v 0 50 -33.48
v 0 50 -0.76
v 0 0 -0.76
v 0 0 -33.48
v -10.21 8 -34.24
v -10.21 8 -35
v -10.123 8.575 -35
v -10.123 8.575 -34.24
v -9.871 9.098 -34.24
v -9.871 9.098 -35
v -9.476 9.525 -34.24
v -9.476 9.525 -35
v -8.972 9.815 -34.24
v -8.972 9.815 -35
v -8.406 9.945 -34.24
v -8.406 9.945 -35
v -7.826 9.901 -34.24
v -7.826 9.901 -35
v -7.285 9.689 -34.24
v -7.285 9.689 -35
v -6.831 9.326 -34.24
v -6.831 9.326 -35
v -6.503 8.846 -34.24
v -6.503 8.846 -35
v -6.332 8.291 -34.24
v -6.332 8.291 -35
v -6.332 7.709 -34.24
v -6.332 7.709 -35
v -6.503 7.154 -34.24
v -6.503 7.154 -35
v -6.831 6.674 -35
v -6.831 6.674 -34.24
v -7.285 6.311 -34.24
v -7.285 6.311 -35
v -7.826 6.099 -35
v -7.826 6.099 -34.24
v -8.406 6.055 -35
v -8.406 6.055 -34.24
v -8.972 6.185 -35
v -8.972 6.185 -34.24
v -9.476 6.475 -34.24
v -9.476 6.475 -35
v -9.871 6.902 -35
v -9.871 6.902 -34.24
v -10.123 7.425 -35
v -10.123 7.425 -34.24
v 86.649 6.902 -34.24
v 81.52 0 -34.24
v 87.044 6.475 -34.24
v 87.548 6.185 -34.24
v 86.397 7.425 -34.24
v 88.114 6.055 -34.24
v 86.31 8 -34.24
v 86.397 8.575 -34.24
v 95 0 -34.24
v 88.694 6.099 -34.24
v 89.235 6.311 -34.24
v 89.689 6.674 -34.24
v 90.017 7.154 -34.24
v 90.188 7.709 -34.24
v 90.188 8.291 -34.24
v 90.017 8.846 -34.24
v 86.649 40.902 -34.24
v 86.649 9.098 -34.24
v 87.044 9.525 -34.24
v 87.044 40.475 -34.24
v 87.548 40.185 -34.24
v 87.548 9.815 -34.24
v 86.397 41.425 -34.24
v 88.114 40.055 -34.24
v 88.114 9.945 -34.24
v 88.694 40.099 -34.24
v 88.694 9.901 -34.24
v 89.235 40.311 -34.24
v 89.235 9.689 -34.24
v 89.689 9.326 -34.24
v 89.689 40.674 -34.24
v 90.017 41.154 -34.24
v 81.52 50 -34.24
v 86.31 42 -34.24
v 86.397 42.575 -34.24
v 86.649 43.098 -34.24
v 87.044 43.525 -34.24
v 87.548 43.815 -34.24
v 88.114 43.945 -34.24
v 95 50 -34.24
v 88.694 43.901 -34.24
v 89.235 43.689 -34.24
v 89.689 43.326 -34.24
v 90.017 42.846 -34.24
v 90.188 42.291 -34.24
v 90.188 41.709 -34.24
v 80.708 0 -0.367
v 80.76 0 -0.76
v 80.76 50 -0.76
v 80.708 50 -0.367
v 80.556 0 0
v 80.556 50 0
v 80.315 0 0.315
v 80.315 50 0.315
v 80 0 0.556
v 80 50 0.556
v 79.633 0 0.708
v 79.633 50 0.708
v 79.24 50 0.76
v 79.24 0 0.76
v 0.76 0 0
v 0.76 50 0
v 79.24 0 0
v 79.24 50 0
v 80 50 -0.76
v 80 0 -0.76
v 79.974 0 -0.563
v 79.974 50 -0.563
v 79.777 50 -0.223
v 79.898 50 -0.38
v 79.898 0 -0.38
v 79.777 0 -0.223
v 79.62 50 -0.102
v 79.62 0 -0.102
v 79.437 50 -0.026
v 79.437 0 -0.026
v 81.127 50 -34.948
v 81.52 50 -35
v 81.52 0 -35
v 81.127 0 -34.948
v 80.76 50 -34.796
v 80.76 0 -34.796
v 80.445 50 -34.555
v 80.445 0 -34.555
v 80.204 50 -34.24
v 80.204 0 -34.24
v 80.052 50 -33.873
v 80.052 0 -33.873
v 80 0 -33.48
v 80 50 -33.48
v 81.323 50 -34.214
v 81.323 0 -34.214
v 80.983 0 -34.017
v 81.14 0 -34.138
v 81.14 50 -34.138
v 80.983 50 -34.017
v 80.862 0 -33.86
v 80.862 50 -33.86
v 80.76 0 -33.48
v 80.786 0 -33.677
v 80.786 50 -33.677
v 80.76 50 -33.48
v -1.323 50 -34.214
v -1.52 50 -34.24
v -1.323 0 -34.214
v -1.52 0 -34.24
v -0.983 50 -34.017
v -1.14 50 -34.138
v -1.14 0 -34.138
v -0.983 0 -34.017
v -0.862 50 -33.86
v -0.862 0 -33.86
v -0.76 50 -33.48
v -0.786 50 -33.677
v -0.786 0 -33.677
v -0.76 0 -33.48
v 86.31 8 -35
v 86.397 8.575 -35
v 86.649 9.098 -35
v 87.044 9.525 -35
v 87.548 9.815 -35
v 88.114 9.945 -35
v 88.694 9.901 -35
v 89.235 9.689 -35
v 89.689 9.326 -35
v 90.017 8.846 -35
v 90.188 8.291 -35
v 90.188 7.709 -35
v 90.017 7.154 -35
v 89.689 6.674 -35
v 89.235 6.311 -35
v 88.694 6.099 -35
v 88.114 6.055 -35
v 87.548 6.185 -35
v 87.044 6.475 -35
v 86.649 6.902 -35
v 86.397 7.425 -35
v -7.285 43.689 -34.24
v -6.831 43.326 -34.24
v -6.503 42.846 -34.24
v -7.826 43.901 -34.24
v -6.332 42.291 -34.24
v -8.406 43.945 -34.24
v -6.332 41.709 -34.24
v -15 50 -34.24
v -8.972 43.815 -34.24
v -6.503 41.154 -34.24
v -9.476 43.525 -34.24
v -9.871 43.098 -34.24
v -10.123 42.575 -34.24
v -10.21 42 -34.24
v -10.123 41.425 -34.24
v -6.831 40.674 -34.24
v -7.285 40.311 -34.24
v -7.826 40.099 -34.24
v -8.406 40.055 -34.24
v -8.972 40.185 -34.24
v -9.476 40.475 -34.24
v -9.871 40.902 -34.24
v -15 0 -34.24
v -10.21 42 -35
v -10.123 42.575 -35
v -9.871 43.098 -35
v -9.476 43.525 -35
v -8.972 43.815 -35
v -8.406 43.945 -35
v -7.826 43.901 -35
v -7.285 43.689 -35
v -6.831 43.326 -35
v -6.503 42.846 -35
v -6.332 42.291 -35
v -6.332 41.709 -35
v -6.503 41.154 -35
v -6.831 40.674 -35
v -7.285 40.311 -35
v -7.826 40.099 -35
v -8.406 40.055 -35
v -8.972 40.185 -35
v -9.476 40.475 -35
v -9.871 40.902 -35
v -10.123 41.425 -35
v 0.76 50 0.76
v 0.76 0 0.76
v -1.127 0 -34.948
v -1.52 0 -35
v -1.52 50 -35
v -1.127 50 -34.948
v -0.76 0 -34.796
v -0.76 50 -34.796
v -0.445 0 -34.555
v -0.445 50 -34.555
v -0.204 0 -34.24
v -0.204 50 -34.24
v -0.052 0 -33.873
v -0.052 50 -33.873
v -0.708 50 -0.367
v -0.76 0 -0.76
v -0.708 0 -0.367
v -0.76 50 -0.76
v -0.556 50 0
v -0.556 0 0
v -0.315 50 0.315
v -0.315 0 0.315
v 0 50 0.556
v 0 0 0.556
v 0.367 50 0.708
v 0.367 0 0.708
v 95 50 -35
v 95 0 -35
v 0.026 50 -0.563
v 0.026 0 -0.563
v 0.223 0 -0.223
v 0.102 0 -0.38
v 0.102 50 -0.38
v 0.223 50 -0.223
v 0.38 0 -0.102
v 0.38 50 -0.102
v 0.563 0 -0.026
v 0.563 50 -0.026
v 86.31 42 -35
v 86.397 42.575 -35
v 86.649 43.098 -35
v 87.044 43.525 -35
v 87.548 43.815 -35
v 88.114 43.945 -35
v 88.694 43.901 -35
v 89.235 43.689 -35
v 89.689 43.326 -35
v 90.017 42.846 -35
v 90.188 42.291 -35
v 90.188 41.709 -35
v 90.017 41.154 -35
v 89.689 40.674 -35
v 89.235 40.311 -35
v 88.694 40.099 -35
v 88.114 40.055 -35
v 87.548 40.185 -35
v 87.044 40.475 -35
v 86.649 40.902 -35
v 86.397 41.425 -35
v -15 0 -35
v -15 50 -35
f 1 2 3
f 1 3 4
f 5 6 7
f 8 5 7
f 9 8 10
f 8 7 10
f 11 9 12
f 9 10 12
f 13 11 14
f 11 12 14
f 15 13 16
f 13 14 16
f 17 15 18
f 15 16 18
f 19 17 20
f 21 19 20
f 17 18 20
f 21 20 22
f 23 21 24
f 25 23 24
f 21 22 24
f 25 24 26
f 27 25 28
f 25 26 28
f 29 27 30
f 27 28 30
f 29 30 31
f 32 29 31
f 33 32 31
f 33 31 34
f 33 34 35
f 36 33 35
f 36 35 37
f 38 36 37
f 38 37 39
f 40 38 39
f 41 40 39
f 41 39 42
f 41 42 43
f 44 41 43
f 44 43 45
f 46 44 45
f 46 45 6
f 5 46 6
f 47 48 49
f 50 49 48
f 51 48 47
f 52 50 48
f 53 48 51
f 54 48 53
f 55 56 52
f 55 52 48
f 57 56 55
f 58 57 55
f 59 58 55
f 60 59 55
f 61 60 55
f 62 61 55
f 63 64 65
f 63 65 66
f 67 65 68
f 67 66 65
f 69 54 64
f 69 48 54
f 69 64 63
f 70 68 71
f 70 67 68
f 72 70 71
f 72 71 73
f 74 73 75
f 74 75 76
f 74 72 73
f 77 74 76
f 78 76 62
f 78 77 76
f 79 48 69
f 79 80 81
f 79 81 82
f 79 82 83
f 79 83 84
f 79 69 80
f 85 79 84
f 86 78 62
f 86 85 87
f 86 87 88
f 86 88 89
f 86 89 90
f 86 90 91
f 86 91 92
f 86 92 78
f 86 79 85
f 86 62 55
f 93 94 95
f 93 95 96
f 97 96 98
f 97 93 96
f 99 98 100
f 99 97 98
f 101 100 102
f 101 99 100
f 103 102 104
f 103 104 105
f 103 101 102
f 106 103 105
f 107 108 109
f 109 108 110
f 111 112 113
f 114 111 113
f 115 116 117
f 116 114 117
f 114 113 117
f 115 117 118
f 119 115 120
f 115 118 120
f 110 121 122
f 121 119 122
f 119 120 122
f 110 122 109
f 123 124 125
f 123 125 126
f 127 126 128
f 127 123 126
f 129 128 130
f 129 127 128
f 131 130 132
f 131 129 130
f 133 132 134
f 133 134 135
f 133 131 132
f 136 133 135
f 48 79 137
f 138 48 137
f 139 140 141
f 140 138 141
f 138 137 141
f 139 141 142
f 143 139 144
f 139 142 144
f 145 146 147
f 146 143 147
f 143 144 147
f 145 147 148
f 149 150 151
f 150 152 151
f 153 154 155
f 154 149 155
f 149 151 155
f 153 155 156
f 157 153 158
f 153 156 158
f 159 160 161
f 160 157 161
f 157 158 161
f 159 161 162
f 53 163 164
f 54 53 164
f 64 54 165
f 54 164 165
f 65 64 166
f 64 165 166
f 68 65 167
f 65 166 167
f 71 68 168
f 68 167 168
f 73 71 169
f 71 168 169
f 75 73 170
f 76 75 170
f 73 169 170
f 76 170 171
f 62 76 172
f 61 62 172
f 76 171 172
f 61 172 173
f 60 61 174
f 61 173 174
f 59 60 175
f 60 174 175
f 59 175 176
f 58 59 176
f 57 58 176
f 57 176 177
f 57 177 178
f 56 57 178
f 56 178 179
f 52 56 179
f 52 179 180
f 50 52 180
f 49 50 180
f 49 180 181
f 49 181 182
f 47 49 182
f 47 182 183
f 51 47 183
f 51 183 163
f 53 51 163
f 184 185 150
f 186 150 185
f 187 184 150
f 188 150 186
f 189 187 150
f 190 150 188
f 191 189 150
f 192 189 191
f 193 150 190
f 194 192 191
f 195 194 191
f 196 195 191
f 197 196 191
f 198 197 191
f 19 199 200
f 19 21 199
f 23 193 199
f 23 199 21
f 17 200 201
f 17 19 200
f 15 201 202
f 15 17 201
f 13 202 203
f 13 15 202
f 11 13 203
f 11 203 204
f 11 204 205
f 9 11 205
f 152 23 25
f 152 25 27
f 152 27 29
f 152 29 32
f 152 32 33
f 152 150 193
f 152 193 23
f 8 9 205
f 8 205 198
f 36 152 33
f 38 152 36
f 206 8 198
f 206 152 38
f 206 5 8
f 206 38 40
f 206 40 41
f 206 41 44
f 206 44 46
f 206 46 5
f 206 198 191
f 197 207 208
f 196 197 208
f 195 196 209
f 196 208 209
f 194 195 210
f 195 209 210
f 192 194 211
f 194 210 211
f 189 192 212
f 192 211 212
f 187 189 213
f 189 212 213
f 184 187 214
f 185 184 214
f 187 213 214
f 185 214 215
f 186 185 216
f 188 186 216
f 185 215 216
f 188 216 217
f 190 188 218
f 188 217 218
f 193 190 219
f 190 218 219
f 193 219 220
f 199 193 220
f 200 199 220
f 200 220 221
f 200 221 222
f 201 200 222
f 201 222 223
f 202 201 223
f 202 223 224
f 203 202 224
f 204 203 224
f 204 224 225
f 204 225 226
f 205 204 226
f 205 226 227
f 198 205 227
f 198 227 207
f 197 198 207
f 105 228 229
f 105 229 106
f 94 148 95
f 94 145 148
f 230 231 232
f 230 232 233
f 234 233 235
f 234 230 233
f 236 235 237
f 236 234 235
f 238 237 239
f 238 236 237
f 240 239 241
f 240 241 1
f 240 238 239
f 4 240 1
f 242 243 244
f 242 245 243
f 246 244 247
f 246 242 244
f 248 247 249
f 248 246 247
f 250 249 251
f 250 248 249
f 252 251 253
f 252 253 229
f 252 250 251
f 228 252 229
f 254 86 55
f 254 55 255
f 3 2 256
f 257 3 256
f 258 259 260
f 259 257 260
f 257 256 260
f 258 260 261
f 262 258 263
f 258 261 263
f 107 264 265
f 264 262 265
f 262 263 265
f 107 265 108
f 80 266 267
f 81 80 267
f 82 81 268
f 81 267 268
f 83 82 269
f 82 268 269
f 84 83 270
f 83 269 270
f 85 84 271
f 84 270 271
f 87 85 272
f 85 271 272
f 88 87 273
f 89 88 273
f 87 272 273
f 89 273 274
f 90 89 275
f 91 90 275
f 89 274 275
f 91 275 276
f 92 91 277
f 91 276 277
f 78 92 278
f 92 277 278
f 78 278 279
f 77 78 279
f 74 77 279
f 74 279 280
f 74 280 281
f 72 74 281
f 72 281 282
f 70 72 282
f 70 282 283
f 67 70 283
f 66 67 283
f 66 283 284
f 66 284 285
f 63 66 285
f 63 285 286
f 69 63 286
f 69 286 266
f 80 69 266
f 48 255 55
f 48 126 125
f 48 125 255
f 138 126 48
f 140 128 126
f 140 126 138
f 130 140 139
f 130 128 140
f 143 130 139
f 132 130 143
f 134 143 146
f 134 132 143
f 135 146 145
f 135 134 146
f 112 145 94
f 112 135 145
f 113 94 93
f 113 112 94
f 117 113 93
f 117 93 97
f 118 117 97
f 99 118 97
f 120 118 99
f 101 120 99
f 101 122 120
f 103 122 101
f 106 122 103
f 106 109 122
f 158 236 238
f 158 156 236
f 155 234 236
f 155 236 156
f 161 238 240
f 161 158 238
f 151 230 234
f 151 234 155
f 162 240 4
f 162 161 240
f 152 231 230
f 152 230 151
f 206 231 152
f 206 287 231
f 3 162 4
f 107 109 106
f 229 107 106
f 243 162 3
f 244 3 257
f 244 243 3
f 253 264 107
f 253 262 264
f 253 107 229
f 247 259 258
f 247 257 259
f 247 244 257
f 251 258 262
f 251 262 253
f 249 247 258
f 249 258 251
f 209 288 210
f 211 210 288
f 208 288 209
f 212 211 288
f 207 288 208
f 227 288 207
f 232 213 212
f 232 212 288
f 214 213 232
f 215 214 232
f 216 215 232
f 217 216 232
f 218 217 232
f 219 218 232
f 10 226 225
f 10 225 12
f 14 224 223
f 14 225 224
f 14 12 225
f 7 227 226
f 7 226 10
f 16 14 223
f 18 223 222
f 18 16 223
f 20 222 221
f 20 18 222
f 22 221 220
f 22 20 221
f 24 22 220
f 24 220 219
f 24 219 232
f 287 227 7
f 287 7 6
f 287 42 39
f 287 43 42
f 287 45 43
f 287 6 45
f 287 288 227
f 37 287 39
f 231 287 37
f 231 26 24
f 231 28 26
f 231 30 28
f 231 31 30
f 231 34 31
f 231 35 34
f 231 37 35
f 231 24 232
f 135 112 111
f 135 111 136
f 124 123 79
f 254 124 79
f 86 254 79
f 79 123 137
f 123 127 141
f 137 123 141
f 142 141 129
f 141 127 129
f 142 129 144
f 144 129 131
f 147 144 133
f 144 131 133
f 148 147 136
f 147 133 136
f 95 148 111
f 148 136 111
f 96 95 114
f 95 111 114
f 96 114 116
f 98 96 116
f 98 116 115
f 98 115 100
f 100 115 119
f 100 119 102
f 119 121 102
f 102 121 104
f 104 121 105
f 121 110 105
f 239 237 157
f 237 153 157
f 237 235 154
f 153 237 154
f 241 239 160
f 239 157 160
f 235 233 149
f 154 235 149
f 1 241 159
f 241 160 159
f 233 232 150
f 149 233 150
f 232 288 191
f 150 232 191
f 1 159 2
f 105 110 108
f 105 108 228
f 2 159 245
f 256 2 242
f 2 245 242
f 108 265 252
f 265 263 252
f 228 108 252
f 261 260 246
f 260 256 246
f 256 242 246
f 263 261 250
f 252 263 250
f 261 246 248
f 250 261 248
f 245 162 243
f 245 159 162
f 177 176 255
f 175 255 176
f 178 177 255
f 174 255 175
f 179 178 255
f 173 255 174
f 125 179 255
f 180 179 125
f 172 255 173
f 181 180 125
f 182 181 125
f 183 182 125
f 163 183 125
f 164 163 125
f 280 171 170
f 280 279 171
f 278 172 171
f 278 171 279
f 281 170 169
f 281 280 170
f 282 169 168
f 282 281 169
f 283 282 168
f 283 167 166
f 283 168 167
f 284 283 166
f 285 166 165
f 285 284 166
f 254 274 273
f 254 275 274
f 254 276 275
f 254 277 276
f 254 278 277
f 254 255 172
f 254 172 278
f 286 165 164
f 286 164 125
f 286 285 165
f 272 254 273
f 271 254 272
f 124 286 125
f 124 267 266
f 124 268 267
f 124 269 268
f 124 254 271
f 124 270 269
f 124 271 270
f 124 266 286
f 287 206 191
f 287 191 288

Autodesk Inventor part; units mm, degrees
ref_plane "YZ Plane" through (0, 0, 0) normal (1, 0, 0) x (0, 1, 0)
ref_plane "XZ Plane" through (0, 0, 0) normal (0, 1, 0) x (-1, 0, 0)
ref_plane "XY Plane" through (0, 0, 0) normal (0, 0, 1) x (1, 0, 0)
sketch "Boceto1" plane through (0, 0, 0) normal (0, 0, 1) x (1, 0, 0)
  line L0 (0, 0) -> (80, 0)
  line L1 (80, 0) -> (80, 50)
  line L2 (80, 50) -> (0, 50)
  line L3 (0, 50) -> (0, 0)
  dimension "d0" = 80
  dimension "d1" = 50
extrude "Placa1" add sketch "Boceto1" along normal blind 0.76
sketch "Boceto2" plane through (80, 50, 0) normal (1, 0, 0) x (0, 1, 0)
  line L0 (-50, 0) -> (0, 0)
  line L1 (0, 0) -> (0, 34.24)
  line L2 (0, 34.24) -> (-50, 34.24)
  line L3 (-50, 34.24) -> (-50, 0)
edge flange "Pestaña1" height 35 angle 90 thickness 0.76 bend radius 0.76 thickness toward (1, 0, 0) relief tear relief width 0.76 relief depth 0.38 corner gap 0.76 corner form 0 edges at (80, 25, 0.76) (0, 25, 0.76) wall of the first edge with corners at (80, 0, 0) (80, 50, 0) (80, 50, -34.24) (80, 0, -34.24)
bend "Doblez1"
corner "Esquina1"
sketch "Boceto3" plane through (-0.76, 50, -34.24) normal (0, 0, -1) x (1, 0, 0)
  line L0 (0, -50) -> (0, 0)
  line L1 (0, 0) -> (-14.24, 0)
  line L2 (-14.24, 0) -> (-14.24, -50)
  line L3 (-14.24, -50) -> (0, -50)
edge flange "Pestaña2" height 15 angle 90 thickness 0.76 bend radius 0.76 thickness toward (0, 0, -1) relief tear relief width 0.76 relief depth 0.38 corner gap 0.76 corner form 0 edges at (0, 25, -34.24) (80, 25, -34.24) wall of the first edge with corners at (-0.76, 0, -34.24) (-0.76, 50, -34.24) (-15, 50, -34.24) (-15, 0, -34.24)
bend "Doblez2"
corner "Esquina2"
sketch "Boceto4" plane through (-15, 0, -35) normal (0, 0, -1) x (-1, 0, 0)
  circle A0 centre (-6.74, 8) radius 1.95
  circle A1 centre (-6.74, 42) radius 1.95
  point P0 (-15, 0)
  dimension "d23" = 3.9
  dimension "d24" = 3.9
extrude "Extrusión1" cut sketch "Boceto4" against normal through all
sketch "Boceto5" plane through (95, 0, -35) normal (0, 0, -1) x (-1, 0, 0)
  circle A0 centre (6.74, 8) radius 1.95
  circle A1 centre (6.74, 42) radius 1.95
  point P0 (95, 0)
  dimension "d27" = 3.9
  dimension "d28" = 3.9
extrude "Extrusión2" cut sketch "Boceto5" against normal through all
sketch "Boceto6" plane through (0, 0, 0.76) normal (0, 0, 1) x (1, 0, 0)
  point P0 (0, 0)
equation "\"d24\" = d23"
equation "\"d28\" = d27"
equation "\"d2\" = Grosor"
equation "\"d3\" = Anchura_desahogo_plegado"
equation "\"d4\" = Profundidad_desahogo_plegado"
equation "\"d5\" = Remanente_mínimo"
equation "\"d6\" = Radiodetransición"
equation "\"d9\" = Radio_pliegue"
equation "\"d10\" = Tamaño_destalonado"
equation "\"d11\" = TamañoSeparación"
equation "\"d12\" = Tamaño_de_radio_de_Jacobi"
equation "\"d13\" = Anchura_desahogo_plegado"
equation "\"d14\" = Profundidad_desahogo_plegado"
equation "\"d15\" = Remanente_mínimo"
equation "\"d16\" = Radiodetransición"
equation "\"d19\" = Radio_pliegue"
equation "\"d20\" = Tamaño_destalonado"
equation "\"d21\" = TamañoSeparación"
equation "\"d22\" = Tamaño_de_radio_de_Jacobi"
equation "\"Radio_pliegue\" = Grosor"
equation "\"Anchura_desahogo_plegado\" = Grosor"
equation "\"Profundidad_desahogo_plegado\" = 0.5 * Grosor"
equation "\"Tamaño_destalonado\" = 4 * Grosor"
equation "\"Remanente_mínimo\" = 2 * Grosor"
equation "\"Radiodetransición\" = Radio_pliegue"
equation "\"Tamaño_de_radio_de_Jacobi\" = Radio_pliegue"
equation "\"TamañoSeparación\" = Grosor"
equation "\"Grosor\" = 0.76"
properties part number "Base Valvula" material "Steel AISI 1006 85 HR"
